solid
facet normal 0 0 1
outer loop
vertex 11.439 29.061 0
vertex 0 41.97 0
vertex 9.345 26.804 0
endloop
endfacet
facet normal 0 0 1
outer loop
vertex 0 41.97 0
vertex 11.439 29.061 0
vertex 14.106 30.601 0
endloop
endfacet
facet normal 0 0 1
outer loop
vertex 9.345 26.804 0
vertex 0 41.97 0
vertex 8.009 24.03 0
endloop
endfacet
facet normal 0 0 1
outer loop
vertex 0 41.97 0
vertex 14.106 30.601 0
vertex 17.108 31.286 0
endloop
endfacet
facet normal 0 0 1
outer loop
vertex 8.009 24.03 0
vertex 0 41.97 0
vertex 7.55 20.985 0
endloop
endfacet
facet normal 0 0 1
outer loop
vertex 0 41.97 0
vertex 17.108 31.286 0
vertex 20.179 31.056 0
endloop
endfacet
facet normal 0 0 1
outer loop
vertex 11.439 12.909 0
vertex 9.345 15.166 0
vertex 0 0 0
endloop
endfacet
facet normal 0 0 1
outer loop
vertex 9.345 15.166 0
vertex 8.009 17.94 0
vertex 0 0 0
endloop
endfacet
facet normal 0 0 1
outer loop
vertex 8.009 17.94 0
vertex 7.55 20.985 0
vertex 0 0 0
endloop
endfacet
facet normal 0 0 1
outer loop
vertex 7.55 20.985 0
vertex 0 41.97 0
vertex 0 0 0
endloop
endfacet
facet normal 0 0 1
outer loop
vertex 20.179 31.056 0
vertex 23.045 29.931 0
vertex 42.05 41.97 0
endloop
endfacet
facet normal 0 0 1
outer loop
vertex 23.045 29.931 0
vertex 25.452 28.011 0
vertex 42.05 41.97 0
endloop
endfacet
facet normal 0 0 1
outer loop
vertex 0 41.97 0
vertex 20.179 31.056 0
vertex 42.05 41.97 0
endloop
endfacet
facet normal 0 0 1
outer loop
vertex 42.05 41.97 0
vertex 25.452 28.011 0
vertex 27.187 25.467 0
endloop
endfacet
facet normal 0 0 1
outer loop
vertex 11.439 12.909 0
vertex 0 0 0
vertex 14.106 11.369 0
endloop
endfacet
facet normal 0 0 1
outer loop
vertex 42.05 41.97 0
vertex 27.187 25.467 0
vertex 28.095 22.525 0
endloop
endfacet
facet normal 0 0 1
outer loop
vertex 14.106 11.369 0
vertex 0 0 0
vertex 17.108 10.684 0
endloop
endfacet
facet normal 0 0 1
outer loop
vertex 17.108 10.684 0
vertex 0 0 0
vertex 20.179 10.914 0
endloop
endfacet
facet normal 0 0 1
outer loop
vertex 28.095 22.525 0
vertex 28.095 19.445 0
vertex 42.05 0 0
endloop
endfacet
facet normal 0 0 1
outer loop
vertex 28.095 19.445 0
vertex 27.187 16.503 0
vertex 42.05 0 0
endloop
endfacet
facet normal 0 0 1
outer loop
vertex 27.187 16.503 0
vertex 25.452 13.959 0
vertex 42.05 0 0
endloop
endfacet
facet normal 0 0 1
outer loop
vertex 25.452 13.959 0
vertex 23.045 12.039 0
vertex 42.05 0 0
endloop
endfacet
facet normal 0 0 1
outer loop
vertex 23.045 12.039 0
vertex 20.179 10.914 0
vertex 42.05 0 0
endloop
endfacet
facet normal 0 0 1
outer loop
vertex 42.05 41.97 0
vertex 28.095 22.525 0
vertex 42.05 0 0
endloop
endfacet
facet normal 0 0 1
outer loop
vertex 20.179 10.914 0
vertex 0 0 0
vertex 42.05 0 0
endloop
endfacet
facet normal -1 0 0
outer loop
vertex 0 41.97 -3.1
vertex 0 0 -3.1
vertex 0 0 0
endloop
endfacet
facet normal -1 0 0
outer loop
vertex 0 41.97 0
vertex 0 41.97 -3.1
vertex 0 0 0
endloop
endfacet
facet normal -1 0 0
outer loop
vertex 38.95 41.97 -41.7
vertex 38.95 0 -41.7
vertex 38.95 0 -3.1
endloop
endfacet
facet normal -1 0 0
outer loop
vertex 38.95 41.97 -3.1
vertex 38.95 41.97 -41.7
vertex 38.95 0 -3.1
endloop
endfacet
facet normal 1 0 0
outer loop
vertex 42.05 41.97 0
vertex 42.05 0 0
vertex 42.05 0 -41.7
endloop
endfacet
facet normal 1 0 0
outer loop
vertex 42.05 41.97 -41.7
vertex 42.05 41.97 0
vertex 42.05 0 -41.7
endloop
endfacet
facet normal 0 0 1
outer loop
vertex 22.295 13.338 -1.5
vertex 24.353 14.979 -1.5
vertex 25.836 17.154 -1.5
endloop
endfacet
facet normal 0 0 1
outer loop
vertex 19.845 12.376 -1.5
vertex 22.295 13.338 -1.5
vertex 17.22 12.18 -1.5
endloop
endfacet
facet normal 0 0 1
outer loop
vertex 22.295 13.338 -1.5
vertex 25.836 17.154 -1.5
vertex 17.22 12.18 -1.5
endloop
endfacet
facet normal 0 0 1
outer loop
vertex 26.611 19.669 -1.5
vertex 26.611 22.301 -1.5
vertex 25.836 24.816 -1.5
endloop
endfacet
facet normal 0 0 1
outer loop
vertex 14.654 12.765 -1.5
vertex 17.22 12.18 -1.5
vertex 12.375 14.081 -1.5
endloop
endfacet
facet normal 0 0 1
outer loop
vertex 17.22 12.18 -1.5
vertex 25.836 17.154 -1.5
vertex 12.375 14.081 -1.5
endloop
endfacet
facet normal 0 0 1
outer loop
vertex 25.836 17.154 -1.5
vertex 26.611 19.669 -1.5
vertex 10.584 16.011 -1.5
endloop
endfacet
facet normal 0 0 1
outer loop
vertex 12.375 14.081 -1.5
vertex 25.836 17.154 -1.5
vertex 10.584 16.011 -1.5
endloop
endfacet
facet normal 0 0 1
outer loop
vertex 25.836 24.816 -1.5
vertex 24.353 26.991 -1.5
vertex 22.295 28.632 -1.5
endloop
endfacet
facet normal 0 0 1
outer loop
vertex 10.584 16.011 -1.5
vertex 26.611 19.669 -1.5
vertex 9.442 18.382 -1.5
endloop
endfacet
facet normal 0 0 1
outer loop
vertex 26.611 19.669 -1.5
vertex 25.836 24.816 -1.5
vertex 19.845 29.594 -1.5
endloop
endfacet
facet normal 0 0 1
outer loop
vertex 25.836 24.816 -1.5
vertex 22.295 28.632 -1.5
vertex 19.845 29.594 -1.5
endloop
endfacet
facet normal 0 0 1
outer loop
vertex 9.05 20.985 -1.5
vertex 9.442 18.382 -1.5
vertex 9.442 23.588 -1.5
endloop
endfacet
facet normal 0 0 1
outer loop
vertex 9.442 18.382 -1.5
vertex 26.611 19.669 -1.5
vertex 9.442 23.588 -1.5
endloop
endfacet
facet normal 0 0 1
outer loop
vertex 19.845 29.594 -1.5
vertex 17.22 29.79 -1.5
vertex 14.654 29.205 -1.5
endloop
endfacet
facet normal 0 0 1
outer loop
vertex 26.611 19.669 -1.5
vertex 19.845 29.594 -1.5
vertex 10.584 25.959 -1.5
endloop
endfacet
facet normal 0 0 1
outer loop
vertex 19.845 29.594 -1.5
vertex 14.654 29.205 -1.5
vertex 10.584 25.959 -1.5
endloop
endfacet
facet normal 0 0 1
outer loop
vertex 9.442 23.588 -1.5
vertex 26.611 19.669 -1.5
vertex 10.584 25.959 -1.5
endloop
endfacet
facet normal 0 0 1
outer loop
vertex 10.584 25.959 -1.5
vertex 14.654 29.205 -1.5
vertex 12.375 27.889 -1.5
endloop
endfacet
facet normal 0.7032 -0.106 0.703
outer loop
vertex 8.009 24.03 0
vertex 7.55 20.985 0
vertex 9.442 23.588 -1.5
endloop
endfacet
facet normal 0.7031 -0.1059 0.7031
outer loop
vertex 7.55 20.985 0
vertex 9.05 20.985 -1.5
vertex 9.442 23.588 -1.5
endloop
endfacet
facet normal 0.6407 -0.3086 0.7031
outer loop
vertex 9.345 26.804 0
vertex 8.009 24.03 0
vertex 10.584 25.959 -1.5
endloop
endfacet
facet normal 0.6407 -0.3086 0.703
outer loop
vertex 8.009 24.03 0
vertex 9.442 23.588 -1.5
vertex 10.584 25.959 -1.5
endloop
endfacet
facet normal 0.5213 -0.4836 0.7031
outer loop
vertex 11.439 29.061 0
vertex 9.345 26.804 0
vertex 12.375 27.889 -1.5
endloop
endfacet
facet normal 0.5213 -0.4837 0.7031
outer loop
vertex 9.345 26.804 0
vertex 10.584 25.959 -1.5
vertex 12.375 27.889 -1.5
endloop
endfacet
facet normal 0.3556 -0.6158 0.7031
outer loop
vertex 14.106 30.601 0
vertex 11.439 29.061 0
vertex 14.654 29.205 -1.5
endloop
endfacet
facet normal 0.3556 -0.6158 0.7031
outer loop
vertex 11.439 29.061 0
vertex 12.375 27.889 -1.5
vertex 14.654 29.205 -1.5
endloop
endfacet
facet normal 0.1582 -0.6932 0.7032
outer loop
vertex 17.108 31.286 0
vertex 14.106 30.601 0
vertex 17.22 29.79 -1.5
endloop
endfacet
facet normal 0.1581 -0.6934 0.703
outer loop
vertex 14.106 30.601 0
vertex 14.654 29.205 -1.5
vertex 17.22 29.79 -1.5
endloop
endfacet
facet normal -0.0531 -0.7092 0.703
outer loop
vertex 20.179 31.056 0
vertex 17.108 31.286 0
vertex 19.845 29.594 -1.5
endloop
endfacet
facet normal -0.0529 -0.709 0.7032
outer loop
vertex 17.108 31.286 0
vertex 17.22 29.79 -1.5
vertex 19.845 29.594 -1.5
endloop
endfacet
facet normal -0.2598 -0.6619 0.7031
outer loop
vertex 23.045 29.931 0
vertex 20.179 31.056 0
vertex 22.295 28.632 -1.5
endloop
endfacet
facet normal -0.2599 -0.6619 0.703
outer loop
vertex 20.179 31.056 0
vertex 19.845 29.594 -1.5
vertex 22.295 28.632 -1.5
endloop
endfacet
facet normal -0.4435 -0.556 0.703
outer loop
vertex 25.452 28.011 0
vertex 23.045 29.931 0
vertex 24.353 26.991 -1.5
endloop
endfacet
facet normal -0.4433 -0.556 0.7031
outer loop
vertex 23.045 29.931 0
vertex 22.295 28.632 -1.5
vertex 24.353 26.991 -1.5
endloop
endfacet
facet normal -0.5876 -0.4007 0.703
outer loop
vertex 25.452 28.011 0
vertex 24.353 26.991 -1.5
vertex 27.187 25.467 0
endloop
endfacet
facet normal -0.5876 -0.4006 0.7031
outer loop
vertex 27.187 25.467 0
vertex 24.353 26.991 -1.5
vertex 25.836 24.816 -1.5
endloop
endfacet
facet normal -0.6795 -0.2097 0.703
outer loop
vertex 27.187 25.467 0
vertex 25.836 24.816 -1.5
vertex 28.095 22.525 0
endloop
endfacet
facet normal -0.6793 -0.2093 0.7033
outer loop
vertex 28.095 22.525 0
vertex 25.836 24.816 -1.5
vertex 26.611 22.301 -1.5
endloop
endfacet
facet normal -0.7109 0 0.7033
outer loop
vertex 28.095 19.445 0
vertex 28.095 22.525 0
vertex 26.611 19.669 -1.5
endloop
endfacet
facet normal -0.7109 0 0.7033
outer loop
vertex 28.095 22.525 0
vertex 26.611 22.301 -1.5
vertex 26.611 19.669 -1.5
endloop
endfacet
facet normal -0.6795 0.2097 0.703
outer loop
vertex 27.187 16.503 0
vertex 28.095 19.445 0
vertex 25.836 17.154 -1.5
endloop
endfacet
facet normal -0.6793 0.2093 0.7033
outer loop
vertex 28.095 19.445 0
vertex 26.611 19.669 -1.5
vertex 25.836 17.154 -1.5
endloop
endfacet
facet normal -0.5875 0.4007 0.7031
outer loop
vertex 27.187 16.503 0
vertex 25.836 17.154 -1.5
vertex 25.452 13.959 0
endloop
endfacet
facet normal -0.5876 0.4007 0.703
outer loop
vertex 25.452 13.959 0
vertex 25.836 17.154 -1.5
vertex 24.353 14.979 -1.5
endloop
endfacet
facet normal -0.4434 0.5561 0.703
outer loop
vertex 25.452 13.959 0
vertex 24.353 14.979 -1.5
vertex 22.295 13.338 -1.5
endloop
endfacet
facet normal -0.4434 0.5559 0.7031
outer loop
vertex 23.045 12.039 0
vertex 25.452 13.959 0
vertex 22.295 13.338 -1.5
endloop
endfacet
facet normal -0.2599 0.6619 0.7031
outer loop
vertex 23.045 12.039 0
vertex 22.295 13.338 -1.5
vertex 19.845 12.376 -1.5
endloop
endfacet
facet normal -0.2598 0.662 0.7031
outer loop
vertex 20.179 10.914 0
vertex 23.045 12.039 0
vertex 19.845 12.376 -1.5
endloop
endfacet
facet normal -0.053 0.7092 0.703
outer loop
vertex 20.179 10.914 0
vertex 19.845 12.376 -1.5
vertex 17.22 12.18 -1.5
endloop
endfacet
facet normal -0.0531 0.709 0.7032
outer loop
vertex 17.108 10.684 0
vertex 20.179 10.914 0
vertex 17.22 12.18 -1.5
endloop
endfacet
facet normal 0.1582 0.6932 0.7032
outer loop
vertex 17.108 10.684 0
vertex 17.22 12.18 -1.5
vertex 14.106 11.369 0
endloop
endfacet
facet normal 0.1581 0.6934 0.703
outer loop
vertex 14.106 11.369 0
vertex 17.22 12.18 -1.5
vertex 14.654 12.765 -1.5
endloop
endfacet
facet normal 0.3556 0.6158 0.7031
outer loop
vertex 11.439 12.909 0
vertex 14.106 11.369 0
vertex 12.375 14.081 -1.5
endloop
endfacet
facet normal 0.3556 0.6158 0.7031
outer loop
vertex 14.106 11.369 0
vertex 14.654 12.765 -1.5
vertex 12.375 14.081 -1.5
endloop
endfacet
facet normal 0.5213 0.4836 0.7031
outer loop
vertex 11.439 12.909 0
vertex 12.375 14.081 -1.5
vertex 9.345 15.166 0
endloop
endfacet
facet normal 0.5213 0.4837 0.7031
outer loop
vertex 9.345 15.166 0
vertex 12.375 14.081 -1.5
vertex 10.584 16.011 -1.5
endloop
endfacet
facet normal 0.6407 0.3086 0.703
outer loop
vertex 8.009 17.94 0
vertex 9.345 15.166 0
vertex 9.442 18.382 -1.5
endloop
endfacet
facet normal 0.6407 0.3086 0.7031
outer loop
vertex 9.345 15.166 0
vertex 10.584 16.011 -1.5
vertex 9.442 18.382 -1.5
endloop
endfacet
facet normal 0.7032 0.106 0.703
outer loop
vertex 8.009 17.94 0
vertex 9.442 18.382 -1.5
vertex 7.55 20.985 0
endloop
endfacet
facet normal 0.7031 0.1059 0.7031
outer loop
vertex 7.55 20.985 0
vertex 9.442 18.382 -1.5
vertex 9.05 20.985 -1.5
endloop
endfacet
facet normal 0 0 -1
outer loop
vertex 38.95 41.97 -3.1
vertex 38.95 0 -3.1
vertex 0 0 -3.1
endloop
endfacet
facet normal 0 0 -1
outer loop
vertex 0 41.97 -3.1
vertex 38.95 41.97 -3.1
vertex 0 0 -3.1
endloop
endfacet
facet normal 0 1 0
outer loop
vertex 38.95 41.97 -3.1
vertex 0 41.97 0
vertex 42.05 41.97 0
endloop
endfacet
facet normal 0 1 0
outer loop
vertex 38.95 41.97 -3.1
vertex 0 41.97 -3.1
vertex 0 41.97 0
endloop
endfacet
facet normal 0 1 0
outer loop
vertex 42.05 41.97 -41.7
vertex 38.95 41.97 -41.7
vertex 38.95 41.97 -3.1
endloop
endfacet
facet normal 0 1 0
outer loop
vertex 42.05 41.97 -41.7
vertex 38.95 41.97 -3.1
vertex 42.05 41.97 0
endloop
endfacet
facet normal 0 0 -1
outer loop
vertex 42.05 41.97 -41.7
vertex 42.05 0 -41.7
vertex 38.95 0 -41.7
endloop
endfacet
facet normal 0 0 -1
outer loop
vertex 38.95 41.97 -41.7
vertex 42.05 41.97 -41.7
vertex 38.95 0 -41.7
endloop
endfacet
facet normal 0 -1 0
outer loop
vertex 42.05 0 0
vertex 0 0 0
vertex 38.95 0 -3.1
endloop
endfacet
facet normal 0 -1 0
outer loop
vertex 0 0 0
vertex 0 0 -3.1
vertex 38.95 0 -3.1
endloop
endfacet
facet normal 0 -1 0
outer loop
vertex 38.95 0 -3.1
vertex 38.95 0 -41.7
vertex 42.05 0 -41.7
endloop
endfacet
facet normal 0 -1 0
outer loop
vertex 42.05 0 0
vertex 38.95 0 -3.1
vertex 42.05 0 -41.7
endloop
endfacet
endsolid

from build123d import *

# Parameters (mm, degrees)
BOSS_EXTRUDE1_DEPTH = 41.97
SKETCH2_R           = 10.33
CUT_EXTRUDE2_DEPTH  = 1.5
CUT_EXTRUDE2_TAPER  = 45


with BuildPart() as part:
    # Sketch1 → Boss-Extrude1 (new body)
    with BuildSketch(Plane(origin=(0, 0, 0), x_dir=(1, 0, 0), z_dir=(0, 1, 0))):
        Polygon((0, 0), (42.05, 0), (42.05, 41.7), (38.95, 41.7), (38.95, 3.1), (0, 3.1), align=None)
    extrude(amount=BOSS_EXTRUDE1_DEPTH)

    # Sketch2 → Cut-Extrude2 (cut)
    with BuildSketch(Plane(origin=(42.05, 0, 0), x_dir=(-1, 0, 0), z_dir=(0, 0, -1))):
        with Locations((24.17, 20.985)):
            Circle(SKETCH2_R)
    extrude(amount=CUT_EXTRUDE2_DEPTH, taper=CUT_EXTRUDE2_TAPER, mode=Mode.SUBTRACT)


solid = part.part
